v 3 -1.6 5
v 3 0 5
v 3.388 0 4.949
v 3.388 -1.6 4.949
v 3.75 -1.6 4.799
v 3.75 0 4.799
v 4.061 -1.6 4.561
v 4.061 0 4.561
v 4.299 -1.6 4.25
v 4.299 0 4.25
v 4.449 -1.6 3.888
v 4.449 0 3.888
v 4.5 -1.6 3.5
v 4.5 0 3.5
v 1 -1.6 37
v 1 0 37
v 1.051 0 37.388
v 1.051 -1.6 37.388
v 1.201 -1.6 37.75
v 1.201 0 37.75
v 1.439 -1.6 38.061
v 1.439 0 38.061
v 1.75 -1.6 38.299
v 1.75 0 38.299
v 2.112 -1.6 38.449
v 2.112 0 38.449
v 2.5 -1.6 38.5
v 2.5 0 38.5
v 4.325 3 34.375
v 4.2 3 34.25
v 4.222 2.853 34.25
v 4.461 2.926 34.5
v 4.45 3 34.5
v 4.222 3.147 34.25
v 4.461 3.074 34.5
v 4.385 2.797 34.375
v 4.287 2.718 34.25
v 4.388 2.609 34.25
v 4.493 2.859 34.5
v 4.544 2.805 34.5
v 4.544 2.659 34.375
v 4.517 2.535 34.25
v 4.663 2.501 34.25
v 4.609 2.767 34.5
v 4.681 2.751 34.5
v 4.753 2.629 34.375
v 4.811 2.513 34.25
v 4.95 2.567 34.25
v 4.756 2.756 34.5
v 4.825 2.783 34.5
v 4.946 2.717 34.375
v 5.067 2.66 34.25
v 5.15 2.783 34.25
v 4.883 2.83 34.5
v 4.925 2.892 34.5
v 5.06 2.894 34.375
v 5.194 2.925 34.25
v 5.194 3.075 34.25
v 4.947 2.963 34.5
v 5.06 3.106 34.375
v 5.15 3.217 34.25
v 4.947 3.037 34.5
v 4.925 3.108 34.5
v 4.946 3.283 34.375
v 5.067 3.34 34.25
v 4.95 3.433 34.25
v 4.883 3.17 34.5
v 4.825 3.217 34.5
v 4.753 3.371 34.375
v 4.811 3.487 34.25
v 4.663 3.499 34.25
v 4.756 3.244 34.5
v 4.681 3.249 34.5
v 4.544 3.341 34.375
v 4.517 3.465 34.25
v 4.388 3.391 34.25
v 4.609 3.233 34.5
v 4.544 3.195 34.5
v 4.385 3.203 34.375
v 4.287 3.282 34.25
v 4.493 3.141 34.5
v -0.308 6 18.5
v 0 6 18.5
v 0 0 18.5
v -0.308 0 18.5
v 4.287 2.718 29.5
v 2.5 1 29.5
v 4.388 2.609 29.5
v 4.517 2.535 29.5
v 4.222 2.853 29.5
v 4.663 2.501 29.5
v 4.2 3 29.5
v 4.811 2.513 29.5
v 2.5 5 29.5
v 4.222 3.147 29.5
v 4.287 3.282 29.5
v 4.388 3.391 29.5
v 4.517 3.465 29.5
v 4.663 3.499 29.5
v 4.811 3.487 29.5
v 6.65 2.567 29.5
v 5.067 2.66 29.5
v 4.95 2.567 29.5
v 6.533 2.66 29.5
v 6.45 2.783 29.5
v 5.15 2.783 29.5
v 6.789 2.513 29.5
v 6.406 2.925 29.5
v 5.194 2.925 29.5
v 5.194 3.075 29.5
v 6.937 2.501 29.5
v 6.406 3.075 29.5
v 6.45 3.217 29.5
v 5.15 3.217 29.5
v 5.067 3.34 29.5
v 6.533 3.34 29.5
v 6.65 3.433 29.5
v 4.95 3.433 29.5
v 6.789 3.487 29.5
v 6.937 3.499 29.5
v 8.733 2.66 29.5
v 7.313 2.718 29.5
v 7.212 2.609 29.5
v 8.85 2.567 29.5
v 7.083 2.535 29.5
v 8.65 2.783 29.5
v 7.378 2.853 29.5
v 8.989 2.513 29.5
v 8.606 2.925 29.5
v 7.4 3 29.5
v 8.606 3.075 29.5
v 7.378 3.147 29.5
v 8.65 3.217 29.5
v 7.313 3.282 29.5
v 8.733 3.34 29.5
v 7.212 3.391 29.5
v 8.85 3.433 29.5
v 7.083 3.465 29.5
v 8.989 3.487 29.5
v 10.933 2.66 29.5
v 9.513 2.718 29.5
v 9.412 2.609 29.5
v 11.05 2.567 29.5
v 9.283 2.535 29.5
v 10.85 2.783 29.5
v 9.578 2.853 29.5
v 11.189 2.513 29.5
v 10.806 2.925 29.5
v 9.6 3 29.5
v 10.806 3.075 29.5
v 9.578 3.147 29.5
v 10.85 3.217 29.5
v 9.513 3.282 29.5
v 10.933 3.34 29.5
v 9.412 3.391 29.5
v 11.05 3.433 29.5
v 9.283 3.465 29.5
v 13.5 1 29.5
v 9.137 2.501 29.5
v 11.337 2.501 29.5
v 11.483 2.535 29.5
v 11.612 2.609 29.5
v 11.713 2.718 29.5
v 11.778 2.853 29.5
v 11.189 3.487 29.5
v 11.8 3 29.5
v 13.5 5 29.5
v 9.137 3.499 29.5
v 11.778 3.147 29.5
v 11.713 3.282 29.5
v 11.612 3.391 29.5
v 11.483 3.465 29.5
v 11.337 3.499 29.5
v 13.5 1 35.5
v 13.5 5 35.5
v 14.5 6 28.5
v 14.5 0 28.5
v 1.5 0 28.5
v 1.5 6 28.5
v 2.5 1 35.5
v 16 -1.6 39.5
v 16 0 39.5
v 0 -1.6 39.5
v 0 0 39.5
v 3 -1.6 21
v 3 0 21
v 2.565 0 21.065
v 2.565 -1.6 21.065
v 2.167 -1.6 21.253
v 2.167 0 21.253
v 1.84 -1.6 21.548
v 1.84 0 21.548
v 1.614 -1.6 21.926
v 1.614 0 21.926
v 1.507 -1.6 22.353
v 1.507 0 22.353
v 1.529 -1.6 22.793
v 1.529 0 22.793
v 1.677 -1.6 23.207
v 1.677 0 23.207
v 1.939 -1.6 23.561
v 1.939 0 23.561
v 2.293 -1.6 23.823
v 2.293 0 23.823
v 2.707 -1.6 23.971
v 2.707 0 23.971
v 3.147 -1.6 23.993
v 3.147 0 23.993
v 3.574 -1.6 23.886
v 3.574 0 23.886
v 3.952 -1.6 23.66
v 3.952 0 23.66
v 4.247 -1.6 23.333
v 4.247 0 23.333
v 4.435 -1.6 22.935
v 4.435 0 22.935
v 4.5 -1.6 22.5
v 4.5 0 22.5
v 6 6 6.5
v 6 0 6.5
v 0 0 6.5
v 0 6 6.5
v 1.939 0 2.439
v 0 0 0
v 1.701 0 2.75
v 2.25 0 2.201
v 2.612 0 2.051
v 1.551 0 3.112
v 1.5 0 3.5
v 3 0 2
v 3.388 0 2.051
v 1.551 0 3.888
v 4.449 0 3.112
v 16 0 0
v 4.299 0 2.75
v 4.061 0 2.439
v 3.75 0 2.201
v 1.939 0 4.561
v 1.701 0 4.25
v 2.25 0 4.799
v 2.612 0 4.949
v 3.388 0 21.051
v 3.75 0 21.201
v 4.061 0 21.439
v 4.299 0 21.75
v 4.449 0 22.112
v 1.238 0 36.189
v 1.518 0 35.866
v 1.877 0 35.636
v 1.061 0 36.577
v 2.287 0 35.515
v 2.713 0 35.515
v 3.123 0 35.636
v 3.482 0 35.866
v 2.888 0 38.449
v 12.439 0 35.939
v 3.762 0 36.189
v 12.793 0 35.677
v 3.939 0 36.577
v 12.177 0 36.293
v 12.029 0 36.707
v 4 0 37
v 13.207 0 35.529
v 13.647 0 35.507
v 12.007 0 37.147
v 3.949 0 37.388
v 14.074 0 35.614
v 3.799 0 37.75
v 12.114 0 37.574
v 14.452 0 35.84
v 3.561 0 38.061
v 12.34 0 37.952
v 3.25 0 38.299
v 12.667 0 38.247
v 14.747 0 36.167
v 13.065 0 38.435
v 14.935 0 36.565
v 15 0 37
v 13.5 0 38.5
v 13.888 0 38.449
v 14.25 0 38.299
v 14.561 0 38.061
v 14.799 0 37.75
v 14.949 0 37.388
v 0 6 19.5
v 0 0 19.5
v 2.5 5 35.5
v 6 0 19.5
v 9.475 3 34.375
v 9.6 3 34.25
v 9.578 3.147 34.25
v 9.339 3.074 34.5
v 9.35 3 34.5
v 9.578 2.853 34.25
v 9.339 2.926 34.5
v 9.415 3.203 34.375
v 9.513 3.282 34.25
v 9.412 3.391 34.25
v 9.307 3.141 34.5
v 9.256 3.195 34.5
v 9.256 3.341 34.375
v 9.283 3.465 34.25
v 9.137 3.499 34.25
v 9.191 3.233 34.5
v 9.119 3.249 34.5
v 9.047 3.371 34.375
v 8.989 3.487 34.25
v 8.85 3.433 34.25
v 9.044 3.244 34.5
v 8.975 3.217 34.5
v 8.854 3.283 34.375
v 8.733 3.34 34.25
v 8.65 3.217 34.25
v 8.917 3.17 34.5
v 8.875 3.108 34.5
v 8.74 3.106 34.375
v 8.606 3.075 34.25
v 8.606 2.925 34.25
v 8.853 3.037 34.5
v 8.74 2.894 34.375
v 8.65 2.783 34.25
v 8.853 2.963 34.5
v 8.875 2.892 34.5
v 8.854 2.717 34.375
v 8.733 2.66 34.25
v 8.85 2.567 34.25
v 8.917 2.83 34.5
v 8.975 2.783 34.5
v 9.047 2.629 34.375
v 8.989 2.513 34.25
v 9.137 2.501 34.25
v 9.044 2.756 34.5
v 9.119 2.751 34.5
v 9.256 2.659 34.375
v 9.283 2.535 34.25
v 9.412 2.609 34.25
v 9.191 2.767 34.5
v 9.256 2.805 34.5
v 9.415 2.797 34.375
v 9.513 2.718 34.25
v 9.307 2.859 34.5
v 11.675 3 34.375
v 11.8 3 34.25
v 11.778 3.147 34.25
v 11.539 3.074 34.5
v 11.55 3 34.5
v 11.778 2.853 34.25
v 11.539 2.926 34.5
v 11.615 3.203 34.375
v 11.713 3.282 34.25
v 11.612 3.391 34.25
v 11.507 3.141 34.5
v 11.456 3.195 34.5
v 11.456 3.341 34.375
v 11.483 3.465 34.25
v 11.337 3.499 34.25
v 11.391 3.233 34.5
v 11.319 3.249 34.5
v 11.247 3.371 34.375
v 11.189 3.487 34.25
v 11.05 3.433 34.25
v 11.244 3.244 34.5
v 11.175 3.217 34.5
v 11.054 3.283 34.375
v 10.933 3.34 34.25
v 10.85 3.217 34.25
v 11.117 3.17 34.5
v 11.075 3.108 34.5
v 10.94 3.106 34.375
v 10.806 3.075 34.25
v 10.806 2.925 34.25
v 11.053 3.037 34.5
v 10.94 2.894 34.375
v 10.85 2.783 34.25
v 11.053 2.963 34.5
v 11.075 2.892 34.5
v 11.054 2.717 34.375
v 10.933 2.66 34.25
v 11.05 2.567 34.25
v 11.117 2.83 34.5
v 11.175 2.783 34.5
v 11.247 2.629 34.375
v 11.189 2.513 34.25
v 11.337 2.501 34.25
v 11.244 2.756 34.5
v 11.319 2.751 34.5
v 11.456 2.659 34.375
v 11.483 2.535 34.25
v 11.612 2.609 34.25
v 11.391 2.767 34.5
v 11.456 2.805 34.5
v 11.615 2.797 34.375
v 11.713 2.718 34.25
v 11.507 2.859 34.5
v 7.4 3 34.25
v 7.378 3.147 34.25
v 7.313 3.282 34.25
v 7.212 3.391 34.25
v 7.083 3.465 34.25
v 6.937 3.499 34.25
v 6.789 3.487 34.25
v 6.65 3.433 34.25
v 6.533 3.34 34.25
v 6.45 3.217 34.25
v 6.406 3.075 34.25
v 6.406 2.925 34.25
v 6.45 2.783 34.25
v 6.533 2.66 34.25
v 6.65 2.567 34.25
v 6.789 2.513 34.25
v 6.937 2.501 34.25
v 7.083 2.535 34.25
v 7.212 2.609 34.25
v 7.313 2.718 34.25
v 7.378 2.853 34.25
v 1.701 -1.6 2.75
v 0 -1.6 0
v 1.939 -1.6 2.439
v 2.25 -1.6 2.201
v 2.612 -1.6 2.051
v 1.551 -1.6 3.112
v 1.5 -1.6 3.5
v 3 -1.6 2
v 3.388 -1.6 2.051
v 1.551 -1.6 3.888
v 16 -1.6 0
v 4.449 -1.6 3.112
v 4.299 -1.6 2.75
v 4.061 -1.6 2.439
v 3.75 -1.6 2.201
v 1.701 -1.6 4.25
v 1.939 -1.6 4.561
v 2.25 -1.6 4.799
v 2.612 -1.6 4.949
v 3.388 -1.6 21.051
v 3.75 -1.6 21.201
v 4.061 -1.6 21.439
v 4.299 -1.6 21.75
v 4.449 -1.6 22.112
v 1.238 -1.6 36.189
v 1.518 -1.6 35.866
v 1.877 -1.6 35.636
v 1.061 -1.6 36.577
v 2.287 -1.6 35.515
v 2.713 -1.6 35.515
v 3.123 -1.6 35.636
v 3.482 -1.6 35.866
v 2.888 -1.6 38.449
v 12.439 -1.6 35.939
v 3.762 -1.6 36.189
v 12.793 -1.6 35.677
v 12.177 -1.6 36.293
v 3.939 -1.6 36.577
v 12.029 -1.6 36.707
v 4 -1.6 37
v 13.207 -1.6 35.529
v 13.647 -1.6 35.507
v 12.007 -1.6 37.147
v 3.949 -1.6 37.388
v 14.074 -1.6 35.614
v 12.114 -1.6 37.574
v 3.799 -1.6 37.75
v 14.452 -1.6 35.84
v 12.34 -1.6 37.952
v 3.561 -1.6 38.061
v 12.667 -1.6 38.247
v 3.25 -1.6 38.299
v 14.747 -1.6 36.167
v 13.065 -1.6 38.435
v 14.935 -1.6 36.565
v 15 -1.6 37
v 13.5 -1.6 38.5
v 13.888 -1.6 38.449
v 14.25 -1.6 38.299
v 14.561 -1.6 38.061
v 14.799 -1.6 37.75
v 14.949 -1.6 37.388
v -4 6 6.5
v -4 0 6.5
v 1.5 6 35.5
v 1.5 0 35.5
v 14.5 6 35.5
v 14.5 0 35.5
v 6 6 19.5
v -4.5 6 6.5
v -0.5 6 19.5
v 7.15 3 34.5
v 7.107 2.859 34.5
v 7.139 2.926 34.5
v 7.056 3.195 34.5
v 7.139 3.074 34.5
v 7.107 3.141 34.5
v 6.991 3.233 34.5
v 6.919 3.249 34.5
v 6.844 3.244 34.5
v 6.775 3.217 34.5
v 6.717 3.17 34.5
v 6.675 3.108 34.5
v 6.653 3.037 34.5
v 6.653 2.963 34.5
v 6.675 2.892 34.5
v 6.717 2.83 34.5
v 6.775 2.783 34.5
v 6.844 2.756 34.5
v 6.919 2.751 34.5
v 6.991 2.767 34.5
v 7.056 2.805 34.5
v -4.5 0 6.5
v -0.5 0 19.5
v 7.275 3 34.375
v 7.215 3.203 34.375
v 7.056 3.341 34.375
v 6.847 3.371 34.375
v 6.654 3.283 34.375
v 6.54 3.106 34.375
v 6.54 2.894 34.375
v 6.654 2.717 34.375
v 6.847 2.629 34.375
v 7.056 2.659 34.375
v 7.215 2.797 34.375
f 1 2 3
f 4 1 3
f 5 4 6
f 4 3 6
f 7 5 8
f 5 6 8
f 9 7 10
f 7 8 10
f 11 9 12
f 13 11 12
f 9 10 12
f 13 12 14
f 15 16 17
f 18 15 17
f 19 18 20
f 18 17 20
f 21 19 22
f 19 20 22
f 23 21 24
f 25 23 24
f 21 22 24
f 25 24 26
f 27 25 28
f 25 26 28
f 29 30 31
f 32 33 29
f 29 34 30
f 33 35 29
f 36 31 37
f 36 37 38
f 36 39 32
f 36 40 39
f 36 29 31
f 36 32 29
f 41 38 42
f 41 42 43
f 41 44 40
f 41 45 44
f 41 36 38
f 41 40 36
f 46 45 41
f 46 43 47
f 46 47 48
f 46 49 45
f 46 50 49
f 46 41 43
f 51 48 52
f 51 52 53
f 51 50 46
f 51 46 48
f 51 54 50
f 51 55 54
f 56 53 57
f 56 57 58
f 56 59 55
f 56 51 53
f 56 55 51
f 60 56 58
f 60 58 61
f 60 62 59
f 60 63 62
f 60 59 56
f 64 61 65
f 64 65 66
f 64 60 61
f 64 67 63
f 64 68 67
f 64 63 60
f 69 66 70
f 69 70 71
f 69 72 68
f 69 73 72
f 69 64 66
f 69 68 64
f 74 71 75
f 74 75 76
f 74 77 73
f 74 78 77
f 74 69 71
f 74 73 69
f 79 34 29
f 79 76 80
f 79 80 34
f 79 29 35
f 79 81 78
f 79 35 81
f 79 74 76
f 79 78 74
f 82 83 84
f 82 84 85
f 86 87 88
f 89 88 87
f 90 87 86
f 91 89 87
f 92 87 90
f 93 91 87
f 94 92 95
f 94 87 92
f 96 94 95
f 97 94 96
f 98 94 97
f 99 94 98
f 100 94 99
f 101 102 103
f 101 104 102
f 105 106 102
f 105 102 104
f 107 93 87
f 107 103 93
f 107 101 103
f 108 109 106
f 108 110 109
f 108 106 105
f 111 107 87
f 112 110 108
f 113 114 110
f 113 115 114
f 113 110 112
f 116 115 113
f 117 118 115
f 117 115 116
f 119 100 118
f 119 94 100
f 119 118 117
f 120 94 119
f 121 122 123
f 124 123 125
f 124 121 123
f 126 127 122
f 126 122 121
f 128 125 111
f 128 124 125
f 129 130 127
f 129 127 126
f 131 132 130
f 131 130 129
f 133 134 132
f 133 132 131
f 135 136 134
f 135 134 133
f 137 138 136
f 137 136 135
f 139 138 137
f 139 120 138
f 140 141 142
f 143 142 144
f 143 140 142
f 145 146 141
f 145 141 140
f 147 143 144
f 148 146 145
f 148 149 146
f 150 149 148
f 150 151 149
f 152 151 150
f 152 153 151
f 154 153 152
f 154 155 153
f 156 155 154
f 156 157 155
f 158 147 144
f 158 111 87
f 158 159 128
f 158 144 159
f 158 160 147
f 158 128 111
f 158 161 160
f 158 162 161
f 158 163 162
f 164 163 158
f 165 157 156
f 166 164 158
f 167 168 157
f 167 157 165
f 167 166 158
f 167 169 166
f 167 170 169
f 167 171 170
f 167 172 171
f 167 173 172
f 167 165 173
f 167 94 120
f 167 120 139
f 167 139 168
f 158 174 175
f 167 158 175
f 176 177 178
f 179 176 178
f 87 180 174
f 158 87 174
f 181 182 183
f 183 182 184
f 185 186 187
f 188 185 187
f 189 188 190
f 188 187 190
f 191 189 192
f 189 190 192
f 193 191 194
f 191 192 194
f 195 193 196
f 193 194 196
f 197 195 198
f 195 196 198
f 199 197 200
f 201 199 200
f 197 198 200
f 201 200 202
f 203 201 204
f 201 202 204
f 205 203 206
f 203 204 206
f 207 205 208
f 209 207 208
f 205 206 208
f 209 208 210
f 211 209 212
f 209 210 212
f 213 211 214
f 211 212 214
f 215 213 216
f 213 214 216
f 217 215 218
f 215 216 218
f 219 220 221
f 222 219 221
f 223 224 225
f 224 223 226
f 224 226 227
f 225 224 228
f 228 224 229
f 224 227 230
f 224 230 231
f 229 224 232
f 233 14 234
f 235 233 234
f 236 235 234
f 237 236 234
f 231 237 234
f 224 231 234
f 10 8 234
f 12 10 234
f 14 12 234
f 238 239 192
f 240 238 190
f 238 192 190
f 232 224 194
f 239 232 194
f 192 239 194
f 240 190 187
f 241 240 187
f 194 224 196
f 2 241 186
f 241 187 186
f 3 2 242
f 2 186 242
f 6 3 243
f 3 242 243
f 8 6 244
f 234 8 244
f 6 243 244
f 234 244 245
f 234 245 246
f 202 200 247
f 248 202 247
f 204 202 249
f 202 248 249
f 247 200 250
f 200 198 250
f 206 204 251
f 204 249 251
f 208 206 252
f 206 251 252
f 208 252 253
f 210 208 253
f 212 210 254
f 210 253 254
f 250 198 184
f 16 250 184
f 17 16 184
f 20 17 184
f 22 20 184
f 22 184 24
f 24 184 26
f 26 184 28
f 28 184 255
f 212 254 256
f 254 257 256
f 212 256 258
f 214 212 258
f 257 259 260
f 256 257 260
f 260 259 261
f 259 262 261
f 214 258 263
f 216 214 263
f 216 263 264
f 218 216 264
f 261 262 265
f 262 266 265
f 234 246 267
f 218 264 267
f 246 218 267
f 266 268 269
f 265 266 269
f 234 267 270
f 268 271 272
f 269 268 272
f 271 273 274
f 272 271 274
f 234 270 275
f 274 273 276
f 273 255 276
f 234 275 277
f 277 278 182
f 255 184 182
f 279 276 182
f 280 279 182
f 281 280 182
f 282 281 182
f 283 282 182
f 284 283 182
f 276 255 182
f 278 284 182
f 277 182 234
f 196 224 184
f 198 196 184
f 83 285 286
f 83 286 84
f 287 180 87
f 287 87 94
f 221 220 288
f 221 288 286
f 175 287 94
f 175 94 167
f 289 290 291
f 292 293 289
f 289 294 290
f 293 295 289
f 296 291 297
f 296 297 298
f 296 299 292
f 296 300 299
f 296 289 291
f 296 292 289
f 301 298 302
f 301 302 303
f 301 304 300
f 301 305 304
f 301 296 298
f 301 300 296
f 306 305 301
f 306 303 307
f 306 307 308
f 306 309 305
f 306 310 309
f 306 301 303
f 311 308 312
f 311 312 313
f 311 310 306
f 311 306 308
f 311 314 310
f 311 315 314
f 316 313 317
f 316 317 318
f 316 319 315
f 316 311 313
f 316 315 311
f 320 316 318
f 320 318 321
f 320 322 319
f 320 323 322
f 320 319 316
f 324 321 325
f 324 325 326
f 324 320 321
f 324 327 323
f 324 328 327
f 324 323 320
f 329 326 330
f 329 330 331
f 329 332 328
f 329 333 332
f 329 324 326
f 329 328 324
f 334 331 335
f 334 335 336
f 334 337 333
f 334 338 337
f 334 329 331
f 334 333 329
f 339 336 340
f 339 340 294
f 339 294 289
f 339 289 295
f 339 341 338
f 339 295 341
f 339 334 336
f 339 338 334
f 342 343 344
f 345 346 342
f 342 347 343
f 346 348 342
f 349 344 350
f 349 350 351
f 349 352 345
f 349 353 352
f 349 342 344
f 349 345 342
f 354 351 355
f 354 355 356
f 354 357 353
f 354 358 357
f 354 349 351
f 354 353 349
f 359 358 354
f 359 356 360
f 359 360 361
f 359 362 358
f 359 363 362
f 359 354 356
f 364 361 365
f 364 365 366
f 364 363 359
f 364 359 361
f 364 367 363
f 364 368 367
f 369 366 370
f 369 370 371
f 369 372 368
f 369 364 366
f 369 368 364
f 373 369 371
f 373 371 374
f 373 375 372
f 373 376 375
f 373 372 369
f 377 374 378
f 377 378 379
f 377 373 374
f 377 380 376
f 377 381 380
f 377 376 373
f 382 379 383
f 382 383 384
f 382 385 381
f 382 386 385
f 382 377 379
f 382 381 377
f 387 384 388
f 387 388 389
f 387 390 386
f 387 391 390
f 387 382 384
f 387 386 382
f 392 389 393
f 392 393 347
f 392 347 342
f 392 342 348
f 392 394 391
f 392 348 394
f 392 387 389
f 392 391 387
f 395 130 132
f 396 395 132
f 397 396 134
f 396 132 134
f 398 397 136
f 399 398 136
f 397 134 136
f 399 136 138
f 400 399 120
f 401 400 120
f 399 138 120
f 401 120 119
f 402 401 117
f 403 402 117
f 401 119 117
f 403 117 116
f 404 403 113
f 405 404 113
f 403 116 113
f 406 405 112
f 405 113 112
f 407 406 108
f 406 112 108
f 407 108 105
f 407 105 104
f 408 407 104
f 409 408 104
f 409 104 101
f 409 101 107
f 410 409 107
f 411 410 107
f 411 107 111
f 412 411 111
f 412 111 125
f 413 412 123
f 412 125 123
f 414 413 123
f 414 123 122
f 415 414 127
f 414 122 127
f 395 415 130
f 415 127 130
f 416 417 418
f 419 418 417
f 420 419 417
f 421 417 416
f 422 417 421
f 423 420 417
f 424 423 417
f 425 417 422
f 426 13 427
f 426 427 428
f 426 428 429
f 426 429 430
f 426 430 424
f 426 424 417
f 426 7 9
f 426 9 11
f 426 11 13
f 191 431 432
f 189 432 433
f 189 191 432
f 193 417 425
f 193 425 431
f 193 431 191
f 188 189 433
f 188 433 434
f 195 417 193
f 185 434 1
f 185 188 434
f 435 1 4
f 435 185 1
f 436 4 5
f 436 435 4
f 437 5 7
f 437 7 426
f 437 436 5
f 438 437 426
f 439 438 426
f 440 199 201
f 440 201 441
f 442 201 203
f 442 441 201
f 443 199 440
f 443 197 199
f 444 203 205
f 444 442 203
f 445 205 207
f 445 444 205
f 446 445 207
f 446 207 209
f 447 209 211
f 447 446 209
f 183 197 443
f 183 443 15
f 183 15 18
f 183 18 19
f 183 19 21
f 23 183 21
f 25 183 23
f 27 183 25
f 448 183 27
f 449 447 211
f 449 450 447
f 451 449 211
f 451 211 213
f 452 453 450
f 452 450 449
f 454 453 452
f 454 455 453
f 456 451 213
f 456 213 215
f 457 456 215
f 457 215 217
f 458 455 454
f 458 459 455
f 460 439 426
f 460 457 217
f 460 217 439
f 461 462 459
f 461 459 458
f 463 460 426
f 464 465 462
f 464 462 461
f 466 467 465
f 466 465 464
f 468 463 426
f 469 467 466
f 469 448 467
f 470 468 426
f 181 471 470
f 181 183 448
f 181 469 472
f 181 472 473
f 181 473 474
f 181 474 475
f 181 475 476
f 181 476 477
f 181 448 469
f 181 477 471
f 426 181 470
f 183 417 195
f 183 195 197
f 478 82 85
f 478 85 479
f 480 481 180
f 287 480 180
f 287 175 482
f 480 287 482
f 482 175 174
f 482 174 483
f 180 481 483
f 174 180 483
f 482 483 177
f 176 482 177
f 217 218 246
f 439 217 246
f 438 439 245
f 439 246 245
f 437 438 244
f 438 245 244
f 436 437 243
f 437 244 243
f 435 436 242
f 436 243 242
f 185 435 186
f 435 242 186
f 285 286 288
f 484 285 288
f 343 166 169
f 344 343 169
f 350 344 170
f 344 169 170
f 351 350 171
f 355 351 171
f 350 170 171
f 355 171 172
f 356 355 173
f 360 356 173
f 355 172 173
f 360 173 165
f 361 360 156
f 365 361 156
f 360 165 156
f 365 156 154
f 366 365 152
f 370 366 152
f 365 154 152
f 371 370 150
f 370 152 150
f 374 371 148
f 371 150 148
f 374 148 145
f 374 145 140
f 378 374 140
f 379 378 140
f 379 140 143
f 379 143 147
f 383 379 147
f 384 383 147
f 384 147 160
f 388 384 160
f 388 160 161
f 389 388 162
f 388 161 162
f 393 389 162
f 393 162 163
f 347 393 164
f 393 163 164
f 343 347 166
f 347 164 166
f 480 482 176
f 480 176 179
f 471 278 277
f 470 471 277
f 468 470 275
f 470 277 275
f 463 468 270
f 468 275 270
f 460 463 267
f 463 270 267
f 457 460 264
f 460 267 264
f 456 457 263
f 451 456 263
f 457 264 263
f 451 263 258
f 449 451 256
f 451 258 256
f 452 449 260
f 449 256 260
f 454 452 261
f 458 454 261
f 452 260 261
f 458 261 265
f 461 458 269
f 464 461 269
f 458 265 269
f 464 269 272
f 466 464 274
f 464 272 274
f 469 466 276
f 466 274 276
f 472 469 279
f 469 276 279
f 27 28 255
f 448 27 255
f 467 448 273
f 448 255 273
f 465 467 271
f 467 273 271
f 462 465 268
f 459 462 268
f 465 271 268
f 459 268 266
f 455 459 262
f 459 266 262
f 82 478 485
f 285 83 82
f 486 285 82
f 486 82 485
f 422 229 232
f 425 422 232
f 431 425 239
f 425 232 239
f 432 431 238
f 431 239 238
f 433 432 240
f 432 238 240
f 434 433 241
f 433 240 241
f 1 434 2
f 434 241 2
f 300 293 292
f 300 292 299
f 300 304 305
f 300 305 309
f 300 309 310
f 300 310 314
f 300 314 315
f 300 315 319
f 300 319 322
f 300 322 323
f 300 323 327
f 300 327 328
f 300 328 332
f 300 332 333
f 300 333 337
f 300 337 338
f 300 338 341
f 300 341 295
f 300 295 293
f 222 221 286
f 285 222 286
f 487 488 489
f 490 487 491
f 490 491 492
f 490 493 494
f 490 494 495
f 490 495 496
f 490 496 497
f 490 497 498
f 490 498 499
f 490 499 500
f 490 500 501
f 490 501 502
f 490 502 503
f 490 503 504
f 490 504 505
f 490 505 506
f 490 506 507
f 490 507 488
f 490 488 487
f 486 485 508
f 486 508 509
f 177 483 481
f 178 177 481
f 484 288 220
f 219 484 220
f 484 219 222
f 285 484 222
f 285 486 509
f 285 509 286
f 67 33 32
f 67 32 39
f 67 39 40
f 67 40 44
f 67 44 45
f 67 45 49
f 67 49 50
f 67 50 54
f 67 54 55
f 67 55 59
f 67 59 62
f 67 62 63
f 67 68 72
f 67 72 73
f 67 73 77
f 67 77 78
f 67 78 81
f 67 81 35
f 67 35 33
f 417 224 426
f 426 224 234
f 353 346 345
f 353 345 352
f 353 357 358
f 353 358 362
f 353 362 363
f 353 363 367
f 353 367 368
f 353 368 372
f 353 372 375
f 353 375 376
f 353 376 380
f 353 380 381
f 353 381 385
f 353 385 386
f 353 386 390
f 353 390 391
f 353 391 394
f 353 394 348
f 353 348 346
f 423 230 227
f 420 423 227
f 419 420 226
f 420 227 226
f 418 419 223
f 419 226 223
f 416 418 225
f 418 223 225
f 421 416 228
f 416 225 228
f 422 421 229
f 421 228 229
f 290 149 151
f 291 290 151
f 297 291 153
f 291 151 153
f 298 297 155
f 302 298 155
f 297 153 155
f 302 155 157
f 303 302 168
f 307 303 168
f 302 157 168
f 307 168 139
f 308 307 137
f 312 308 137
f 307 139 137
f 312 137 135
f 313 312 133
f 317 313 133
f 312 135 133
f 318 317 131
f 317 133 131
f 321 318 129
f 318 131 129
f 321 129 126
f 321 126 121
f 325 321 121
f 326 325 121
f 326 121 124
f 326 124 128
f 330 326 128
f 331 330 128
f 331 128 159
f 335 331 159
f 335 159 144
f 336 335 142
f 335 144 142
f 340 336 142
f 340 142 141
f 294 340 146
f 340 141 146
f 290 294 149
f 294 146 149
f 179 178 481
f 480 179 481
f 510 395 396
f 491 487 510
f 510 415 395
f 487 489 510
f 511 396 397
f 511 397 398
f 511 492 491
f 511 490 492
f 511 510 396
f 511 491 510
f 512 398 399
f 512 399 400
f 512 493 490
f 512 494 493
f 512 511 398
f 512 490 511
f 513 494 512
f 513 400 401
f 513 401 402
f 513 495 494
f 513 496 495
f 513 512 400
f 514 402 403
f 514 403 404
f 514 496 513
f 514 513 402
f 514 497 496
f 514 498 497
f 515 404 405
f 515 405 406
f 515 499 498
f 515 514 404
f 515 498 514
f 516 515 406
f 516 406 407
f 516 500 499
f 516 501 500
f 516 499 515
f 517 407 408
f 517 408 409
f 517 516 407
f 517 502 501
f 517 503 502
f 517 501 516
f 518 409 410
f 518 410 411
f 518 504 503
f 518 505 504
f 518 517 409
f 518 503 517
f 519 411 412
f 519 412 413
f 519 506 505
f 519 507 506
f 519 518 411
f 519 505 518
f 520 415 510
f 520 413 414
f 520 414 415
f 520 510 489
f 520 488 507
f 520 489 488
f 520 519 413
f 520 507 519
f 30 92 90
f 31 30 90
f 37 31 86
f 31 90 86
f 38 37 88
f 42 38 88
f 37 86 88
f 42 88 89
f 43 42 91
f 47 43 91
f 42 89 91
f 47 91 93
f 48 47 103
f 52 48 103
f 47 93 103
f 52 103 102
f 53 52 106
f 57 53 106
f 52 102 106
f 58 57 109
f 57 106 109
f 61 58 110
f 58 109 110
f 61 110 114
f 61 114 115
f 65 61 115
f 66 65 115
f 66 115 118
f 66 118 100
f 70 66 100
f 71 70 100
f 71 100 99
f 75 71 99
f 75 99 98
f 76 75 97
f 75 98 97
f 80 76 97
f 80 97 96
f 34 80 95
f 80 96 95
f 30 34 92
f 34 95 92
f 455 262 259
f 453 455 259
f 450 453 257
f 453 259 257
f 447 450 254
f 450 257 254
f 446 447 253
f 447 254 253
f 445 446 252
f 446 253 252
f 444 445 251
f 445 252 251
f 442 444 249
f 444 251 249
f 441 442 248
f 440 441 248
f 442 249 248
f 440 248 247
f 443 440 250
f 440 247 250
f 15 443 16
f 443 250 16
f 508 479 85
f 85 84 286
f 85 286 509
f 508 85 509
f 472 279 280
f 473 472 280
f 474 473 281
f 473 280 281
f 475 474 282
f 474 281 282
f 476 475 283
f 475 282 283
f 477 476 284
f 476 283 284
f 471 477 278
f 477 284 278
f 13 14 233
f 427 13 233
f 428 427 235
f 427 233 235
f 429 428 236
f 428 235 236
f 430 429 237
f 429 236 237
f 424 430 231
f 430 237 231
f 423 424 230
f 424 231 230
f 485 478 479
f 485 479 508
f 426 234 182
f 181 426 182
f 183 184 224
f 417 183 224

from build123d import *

# Parameters (mm, degrees)
F1_DEPTH  = 1.6
F3_DEPTH  = 6
F5_DEPTH  = 6
F7_DEPTH  = 6
F8_W      = 11
F8_H      = 4
F9_DEPTH  = 6
F10_R     = 0.5
F11_DEPTH = 5
F12_SIZE  = 0.25


with BuildPart() as f1:
    # F0 (on Front) → F1 (new body)
    with BuildSketch(Plane.XZ):
        with BuildLine():
            Line((3, 2), (3, 0))
            Line((3, 0), (16, 0))
            Line((16, 0), (16, 37))
            Line((16, 37), (15, 37))
            ThreePointArc((15, 37), (12.4393398282, 35.9393398282), (13.5, 38.5))
            Line((13.5, 38.5), (13.5, 39.5))
            Line((13.5, 39.5), (2.5, 39.5))
            Line((2.5, 39.5), (2.5, 38.5))
            ThreePointArc((2.5, 38.5), (3.5606601718, 38.0606601718), (4, 37))
            ThreePointArc((4, 37), (2.5, 35.5), (1, 37))
            Line((1, 37), (0, 37))
            Line((0, 37), (0, 3.5))
            Line((0, 3.5), (1.5, 3.5))
            ThreePointArc((1.5, 3.5), (1.9393398282, 4.5606601718), (3, 5))
            ThreePointArc((3, 5), (4.0606601718, 4.5606601718), (4.5, 3.5))
            ThreePointArc((4.5, 3.5), (4.0606601718, 2.4393398282), (3, 2))
        make_face()
        with BuildLine():
            ThreePointArc((4.5, 22.5), (4.0606601718, 21.4393398282), (3, 21))
            ThreePointArc((3, 21), (1.9393398282, 23.5606601718), (4.5, 22.5))
        make_face(mode=Mode.SUBTRACT)
        with BuildLine():
            Line((0, 3.5), (0, 0))
            Line((0, 0), (3, 0))
            Line((3, 0), (3, 2))
            ThreePointArc((3, 2), (1.9393398282, 2.4393398282), (1.5, 3.5))
            Line((1.5, 3.5), (0, 3.5))
        make_face()
        with BuildLine():
            Line((0, 39.5), (0, 37))
            Line((0, 37), (1, 37))
            ThreePointArc((1, 37), (1.4393398282, 38.0606601718), (2.5, 38.5))
            Line((2.5, 38.5), (2.5, 39.5))
            Line((2.5, 39.5), (0, 39.5))
        make_face()
        with BuildLine():
            Line((15, 37), (16, 37))
            Line((16, 37), (16, 39.5))
            Line((16, 39.5), (13.5, 39.5))
            Line((13.5, 39.5), (13.5, 38.5))
            ThreePointArc((13.5, 38.5), (14.5606601718, 38.0606601718), (15, 37))
        make_face()
    extrude(amount=F1_DEPTH)


with BuildPart() as f3:
    # F2 (on face) → F3 (new body)
    with BuildSketch(Plane(origin=(0, 0, 0), x_dir=(-1, 0, 0), z_dir=(0, 1, 0))):
        Polygon((-3, 19.5), (-3, 13), (-3, 6.5), (0, 6.5), (0, 19.5), align=None)
        Polygon((-3, 6.5), (-3, 13), (-3, 19.5), (-6, 19.5), (-6, 6.5), align=None)
    extrude(amount=F3_DEPTH)


with BuildPart() as f5:
    # F4 (on face) → F5 (new body)
    with BuildSketch(Plane(origin=(0, 0, 0), x_dir=(-1, 0, 0), z_dir=(0, 1, 0))):
        Polygon((-1.5, 28.5), (-1.5, 35.5), (-2.5, 35.5), (-13.5, 35.5), (-14.5, 35.5), (-14.5, 28.5), align=None)
    extrude(amount=F5_DEPTH)

    # F8 (on face) → F9 (cut)
    with BuildSketch(Plane.XY.offset(35.5)):
        with Locations((8, 3)):
            Rectangle(F8_W, F8_H)
    extrude(amount=-F9_DEPTH, mode=Mode.SUBTRACT)

    # F10 (on face) → F11 (join)
    with BuildSketch(Plane.XY.offset(29.5)):
        with Locations((11.3, 3)):
            Circle(F10_R)
        with Locations((9.1, 3)):
            Circle(F10_R)
        with Locations((6.9, 3)):
            Circle(F10_R)
        with BuildLine():
            ThreePointArc((5.2, 3), (4.7, 3.5), (4.2, 3))
            ThreePointArc((4.2, 3), (4.7, 2.5), (5.2, 3))
        make_face()
    extrude(amount=F11_DEPTH)

    # F12
    f12_edges = [f5.edges().sort_by_distance(p)[0] for p in [
        (5.2, 3, 34.5),
        (6.4, 3, 34.5),
        (8.6, 3, 34.5),
        (10.8, 3, 34.5),
    ]]
    chamfer(f12_edges, length=F12_SIZE)


with BuildPart() as f7:
    # F6 (on face) → F7 (new body)
    with BuildSketch(Plane(origin=(0, 6, 0), x_dir=(-1, 0, 0), z_dir=(0, 1, 0))):
        Polygon((0.5, 19.5), (0, 19.5), (0.3076923077, 18.5), (4, 6.5), (4.5, 6.5), align=None)
        Polygon((0.3076923077, 18.5), (0, 19.5), (0, 18.5), align=None)
    extrude(amount=-F7_DEPTH)


solid = Compound([f1.part, f3.part, f5.part, f7.part])
